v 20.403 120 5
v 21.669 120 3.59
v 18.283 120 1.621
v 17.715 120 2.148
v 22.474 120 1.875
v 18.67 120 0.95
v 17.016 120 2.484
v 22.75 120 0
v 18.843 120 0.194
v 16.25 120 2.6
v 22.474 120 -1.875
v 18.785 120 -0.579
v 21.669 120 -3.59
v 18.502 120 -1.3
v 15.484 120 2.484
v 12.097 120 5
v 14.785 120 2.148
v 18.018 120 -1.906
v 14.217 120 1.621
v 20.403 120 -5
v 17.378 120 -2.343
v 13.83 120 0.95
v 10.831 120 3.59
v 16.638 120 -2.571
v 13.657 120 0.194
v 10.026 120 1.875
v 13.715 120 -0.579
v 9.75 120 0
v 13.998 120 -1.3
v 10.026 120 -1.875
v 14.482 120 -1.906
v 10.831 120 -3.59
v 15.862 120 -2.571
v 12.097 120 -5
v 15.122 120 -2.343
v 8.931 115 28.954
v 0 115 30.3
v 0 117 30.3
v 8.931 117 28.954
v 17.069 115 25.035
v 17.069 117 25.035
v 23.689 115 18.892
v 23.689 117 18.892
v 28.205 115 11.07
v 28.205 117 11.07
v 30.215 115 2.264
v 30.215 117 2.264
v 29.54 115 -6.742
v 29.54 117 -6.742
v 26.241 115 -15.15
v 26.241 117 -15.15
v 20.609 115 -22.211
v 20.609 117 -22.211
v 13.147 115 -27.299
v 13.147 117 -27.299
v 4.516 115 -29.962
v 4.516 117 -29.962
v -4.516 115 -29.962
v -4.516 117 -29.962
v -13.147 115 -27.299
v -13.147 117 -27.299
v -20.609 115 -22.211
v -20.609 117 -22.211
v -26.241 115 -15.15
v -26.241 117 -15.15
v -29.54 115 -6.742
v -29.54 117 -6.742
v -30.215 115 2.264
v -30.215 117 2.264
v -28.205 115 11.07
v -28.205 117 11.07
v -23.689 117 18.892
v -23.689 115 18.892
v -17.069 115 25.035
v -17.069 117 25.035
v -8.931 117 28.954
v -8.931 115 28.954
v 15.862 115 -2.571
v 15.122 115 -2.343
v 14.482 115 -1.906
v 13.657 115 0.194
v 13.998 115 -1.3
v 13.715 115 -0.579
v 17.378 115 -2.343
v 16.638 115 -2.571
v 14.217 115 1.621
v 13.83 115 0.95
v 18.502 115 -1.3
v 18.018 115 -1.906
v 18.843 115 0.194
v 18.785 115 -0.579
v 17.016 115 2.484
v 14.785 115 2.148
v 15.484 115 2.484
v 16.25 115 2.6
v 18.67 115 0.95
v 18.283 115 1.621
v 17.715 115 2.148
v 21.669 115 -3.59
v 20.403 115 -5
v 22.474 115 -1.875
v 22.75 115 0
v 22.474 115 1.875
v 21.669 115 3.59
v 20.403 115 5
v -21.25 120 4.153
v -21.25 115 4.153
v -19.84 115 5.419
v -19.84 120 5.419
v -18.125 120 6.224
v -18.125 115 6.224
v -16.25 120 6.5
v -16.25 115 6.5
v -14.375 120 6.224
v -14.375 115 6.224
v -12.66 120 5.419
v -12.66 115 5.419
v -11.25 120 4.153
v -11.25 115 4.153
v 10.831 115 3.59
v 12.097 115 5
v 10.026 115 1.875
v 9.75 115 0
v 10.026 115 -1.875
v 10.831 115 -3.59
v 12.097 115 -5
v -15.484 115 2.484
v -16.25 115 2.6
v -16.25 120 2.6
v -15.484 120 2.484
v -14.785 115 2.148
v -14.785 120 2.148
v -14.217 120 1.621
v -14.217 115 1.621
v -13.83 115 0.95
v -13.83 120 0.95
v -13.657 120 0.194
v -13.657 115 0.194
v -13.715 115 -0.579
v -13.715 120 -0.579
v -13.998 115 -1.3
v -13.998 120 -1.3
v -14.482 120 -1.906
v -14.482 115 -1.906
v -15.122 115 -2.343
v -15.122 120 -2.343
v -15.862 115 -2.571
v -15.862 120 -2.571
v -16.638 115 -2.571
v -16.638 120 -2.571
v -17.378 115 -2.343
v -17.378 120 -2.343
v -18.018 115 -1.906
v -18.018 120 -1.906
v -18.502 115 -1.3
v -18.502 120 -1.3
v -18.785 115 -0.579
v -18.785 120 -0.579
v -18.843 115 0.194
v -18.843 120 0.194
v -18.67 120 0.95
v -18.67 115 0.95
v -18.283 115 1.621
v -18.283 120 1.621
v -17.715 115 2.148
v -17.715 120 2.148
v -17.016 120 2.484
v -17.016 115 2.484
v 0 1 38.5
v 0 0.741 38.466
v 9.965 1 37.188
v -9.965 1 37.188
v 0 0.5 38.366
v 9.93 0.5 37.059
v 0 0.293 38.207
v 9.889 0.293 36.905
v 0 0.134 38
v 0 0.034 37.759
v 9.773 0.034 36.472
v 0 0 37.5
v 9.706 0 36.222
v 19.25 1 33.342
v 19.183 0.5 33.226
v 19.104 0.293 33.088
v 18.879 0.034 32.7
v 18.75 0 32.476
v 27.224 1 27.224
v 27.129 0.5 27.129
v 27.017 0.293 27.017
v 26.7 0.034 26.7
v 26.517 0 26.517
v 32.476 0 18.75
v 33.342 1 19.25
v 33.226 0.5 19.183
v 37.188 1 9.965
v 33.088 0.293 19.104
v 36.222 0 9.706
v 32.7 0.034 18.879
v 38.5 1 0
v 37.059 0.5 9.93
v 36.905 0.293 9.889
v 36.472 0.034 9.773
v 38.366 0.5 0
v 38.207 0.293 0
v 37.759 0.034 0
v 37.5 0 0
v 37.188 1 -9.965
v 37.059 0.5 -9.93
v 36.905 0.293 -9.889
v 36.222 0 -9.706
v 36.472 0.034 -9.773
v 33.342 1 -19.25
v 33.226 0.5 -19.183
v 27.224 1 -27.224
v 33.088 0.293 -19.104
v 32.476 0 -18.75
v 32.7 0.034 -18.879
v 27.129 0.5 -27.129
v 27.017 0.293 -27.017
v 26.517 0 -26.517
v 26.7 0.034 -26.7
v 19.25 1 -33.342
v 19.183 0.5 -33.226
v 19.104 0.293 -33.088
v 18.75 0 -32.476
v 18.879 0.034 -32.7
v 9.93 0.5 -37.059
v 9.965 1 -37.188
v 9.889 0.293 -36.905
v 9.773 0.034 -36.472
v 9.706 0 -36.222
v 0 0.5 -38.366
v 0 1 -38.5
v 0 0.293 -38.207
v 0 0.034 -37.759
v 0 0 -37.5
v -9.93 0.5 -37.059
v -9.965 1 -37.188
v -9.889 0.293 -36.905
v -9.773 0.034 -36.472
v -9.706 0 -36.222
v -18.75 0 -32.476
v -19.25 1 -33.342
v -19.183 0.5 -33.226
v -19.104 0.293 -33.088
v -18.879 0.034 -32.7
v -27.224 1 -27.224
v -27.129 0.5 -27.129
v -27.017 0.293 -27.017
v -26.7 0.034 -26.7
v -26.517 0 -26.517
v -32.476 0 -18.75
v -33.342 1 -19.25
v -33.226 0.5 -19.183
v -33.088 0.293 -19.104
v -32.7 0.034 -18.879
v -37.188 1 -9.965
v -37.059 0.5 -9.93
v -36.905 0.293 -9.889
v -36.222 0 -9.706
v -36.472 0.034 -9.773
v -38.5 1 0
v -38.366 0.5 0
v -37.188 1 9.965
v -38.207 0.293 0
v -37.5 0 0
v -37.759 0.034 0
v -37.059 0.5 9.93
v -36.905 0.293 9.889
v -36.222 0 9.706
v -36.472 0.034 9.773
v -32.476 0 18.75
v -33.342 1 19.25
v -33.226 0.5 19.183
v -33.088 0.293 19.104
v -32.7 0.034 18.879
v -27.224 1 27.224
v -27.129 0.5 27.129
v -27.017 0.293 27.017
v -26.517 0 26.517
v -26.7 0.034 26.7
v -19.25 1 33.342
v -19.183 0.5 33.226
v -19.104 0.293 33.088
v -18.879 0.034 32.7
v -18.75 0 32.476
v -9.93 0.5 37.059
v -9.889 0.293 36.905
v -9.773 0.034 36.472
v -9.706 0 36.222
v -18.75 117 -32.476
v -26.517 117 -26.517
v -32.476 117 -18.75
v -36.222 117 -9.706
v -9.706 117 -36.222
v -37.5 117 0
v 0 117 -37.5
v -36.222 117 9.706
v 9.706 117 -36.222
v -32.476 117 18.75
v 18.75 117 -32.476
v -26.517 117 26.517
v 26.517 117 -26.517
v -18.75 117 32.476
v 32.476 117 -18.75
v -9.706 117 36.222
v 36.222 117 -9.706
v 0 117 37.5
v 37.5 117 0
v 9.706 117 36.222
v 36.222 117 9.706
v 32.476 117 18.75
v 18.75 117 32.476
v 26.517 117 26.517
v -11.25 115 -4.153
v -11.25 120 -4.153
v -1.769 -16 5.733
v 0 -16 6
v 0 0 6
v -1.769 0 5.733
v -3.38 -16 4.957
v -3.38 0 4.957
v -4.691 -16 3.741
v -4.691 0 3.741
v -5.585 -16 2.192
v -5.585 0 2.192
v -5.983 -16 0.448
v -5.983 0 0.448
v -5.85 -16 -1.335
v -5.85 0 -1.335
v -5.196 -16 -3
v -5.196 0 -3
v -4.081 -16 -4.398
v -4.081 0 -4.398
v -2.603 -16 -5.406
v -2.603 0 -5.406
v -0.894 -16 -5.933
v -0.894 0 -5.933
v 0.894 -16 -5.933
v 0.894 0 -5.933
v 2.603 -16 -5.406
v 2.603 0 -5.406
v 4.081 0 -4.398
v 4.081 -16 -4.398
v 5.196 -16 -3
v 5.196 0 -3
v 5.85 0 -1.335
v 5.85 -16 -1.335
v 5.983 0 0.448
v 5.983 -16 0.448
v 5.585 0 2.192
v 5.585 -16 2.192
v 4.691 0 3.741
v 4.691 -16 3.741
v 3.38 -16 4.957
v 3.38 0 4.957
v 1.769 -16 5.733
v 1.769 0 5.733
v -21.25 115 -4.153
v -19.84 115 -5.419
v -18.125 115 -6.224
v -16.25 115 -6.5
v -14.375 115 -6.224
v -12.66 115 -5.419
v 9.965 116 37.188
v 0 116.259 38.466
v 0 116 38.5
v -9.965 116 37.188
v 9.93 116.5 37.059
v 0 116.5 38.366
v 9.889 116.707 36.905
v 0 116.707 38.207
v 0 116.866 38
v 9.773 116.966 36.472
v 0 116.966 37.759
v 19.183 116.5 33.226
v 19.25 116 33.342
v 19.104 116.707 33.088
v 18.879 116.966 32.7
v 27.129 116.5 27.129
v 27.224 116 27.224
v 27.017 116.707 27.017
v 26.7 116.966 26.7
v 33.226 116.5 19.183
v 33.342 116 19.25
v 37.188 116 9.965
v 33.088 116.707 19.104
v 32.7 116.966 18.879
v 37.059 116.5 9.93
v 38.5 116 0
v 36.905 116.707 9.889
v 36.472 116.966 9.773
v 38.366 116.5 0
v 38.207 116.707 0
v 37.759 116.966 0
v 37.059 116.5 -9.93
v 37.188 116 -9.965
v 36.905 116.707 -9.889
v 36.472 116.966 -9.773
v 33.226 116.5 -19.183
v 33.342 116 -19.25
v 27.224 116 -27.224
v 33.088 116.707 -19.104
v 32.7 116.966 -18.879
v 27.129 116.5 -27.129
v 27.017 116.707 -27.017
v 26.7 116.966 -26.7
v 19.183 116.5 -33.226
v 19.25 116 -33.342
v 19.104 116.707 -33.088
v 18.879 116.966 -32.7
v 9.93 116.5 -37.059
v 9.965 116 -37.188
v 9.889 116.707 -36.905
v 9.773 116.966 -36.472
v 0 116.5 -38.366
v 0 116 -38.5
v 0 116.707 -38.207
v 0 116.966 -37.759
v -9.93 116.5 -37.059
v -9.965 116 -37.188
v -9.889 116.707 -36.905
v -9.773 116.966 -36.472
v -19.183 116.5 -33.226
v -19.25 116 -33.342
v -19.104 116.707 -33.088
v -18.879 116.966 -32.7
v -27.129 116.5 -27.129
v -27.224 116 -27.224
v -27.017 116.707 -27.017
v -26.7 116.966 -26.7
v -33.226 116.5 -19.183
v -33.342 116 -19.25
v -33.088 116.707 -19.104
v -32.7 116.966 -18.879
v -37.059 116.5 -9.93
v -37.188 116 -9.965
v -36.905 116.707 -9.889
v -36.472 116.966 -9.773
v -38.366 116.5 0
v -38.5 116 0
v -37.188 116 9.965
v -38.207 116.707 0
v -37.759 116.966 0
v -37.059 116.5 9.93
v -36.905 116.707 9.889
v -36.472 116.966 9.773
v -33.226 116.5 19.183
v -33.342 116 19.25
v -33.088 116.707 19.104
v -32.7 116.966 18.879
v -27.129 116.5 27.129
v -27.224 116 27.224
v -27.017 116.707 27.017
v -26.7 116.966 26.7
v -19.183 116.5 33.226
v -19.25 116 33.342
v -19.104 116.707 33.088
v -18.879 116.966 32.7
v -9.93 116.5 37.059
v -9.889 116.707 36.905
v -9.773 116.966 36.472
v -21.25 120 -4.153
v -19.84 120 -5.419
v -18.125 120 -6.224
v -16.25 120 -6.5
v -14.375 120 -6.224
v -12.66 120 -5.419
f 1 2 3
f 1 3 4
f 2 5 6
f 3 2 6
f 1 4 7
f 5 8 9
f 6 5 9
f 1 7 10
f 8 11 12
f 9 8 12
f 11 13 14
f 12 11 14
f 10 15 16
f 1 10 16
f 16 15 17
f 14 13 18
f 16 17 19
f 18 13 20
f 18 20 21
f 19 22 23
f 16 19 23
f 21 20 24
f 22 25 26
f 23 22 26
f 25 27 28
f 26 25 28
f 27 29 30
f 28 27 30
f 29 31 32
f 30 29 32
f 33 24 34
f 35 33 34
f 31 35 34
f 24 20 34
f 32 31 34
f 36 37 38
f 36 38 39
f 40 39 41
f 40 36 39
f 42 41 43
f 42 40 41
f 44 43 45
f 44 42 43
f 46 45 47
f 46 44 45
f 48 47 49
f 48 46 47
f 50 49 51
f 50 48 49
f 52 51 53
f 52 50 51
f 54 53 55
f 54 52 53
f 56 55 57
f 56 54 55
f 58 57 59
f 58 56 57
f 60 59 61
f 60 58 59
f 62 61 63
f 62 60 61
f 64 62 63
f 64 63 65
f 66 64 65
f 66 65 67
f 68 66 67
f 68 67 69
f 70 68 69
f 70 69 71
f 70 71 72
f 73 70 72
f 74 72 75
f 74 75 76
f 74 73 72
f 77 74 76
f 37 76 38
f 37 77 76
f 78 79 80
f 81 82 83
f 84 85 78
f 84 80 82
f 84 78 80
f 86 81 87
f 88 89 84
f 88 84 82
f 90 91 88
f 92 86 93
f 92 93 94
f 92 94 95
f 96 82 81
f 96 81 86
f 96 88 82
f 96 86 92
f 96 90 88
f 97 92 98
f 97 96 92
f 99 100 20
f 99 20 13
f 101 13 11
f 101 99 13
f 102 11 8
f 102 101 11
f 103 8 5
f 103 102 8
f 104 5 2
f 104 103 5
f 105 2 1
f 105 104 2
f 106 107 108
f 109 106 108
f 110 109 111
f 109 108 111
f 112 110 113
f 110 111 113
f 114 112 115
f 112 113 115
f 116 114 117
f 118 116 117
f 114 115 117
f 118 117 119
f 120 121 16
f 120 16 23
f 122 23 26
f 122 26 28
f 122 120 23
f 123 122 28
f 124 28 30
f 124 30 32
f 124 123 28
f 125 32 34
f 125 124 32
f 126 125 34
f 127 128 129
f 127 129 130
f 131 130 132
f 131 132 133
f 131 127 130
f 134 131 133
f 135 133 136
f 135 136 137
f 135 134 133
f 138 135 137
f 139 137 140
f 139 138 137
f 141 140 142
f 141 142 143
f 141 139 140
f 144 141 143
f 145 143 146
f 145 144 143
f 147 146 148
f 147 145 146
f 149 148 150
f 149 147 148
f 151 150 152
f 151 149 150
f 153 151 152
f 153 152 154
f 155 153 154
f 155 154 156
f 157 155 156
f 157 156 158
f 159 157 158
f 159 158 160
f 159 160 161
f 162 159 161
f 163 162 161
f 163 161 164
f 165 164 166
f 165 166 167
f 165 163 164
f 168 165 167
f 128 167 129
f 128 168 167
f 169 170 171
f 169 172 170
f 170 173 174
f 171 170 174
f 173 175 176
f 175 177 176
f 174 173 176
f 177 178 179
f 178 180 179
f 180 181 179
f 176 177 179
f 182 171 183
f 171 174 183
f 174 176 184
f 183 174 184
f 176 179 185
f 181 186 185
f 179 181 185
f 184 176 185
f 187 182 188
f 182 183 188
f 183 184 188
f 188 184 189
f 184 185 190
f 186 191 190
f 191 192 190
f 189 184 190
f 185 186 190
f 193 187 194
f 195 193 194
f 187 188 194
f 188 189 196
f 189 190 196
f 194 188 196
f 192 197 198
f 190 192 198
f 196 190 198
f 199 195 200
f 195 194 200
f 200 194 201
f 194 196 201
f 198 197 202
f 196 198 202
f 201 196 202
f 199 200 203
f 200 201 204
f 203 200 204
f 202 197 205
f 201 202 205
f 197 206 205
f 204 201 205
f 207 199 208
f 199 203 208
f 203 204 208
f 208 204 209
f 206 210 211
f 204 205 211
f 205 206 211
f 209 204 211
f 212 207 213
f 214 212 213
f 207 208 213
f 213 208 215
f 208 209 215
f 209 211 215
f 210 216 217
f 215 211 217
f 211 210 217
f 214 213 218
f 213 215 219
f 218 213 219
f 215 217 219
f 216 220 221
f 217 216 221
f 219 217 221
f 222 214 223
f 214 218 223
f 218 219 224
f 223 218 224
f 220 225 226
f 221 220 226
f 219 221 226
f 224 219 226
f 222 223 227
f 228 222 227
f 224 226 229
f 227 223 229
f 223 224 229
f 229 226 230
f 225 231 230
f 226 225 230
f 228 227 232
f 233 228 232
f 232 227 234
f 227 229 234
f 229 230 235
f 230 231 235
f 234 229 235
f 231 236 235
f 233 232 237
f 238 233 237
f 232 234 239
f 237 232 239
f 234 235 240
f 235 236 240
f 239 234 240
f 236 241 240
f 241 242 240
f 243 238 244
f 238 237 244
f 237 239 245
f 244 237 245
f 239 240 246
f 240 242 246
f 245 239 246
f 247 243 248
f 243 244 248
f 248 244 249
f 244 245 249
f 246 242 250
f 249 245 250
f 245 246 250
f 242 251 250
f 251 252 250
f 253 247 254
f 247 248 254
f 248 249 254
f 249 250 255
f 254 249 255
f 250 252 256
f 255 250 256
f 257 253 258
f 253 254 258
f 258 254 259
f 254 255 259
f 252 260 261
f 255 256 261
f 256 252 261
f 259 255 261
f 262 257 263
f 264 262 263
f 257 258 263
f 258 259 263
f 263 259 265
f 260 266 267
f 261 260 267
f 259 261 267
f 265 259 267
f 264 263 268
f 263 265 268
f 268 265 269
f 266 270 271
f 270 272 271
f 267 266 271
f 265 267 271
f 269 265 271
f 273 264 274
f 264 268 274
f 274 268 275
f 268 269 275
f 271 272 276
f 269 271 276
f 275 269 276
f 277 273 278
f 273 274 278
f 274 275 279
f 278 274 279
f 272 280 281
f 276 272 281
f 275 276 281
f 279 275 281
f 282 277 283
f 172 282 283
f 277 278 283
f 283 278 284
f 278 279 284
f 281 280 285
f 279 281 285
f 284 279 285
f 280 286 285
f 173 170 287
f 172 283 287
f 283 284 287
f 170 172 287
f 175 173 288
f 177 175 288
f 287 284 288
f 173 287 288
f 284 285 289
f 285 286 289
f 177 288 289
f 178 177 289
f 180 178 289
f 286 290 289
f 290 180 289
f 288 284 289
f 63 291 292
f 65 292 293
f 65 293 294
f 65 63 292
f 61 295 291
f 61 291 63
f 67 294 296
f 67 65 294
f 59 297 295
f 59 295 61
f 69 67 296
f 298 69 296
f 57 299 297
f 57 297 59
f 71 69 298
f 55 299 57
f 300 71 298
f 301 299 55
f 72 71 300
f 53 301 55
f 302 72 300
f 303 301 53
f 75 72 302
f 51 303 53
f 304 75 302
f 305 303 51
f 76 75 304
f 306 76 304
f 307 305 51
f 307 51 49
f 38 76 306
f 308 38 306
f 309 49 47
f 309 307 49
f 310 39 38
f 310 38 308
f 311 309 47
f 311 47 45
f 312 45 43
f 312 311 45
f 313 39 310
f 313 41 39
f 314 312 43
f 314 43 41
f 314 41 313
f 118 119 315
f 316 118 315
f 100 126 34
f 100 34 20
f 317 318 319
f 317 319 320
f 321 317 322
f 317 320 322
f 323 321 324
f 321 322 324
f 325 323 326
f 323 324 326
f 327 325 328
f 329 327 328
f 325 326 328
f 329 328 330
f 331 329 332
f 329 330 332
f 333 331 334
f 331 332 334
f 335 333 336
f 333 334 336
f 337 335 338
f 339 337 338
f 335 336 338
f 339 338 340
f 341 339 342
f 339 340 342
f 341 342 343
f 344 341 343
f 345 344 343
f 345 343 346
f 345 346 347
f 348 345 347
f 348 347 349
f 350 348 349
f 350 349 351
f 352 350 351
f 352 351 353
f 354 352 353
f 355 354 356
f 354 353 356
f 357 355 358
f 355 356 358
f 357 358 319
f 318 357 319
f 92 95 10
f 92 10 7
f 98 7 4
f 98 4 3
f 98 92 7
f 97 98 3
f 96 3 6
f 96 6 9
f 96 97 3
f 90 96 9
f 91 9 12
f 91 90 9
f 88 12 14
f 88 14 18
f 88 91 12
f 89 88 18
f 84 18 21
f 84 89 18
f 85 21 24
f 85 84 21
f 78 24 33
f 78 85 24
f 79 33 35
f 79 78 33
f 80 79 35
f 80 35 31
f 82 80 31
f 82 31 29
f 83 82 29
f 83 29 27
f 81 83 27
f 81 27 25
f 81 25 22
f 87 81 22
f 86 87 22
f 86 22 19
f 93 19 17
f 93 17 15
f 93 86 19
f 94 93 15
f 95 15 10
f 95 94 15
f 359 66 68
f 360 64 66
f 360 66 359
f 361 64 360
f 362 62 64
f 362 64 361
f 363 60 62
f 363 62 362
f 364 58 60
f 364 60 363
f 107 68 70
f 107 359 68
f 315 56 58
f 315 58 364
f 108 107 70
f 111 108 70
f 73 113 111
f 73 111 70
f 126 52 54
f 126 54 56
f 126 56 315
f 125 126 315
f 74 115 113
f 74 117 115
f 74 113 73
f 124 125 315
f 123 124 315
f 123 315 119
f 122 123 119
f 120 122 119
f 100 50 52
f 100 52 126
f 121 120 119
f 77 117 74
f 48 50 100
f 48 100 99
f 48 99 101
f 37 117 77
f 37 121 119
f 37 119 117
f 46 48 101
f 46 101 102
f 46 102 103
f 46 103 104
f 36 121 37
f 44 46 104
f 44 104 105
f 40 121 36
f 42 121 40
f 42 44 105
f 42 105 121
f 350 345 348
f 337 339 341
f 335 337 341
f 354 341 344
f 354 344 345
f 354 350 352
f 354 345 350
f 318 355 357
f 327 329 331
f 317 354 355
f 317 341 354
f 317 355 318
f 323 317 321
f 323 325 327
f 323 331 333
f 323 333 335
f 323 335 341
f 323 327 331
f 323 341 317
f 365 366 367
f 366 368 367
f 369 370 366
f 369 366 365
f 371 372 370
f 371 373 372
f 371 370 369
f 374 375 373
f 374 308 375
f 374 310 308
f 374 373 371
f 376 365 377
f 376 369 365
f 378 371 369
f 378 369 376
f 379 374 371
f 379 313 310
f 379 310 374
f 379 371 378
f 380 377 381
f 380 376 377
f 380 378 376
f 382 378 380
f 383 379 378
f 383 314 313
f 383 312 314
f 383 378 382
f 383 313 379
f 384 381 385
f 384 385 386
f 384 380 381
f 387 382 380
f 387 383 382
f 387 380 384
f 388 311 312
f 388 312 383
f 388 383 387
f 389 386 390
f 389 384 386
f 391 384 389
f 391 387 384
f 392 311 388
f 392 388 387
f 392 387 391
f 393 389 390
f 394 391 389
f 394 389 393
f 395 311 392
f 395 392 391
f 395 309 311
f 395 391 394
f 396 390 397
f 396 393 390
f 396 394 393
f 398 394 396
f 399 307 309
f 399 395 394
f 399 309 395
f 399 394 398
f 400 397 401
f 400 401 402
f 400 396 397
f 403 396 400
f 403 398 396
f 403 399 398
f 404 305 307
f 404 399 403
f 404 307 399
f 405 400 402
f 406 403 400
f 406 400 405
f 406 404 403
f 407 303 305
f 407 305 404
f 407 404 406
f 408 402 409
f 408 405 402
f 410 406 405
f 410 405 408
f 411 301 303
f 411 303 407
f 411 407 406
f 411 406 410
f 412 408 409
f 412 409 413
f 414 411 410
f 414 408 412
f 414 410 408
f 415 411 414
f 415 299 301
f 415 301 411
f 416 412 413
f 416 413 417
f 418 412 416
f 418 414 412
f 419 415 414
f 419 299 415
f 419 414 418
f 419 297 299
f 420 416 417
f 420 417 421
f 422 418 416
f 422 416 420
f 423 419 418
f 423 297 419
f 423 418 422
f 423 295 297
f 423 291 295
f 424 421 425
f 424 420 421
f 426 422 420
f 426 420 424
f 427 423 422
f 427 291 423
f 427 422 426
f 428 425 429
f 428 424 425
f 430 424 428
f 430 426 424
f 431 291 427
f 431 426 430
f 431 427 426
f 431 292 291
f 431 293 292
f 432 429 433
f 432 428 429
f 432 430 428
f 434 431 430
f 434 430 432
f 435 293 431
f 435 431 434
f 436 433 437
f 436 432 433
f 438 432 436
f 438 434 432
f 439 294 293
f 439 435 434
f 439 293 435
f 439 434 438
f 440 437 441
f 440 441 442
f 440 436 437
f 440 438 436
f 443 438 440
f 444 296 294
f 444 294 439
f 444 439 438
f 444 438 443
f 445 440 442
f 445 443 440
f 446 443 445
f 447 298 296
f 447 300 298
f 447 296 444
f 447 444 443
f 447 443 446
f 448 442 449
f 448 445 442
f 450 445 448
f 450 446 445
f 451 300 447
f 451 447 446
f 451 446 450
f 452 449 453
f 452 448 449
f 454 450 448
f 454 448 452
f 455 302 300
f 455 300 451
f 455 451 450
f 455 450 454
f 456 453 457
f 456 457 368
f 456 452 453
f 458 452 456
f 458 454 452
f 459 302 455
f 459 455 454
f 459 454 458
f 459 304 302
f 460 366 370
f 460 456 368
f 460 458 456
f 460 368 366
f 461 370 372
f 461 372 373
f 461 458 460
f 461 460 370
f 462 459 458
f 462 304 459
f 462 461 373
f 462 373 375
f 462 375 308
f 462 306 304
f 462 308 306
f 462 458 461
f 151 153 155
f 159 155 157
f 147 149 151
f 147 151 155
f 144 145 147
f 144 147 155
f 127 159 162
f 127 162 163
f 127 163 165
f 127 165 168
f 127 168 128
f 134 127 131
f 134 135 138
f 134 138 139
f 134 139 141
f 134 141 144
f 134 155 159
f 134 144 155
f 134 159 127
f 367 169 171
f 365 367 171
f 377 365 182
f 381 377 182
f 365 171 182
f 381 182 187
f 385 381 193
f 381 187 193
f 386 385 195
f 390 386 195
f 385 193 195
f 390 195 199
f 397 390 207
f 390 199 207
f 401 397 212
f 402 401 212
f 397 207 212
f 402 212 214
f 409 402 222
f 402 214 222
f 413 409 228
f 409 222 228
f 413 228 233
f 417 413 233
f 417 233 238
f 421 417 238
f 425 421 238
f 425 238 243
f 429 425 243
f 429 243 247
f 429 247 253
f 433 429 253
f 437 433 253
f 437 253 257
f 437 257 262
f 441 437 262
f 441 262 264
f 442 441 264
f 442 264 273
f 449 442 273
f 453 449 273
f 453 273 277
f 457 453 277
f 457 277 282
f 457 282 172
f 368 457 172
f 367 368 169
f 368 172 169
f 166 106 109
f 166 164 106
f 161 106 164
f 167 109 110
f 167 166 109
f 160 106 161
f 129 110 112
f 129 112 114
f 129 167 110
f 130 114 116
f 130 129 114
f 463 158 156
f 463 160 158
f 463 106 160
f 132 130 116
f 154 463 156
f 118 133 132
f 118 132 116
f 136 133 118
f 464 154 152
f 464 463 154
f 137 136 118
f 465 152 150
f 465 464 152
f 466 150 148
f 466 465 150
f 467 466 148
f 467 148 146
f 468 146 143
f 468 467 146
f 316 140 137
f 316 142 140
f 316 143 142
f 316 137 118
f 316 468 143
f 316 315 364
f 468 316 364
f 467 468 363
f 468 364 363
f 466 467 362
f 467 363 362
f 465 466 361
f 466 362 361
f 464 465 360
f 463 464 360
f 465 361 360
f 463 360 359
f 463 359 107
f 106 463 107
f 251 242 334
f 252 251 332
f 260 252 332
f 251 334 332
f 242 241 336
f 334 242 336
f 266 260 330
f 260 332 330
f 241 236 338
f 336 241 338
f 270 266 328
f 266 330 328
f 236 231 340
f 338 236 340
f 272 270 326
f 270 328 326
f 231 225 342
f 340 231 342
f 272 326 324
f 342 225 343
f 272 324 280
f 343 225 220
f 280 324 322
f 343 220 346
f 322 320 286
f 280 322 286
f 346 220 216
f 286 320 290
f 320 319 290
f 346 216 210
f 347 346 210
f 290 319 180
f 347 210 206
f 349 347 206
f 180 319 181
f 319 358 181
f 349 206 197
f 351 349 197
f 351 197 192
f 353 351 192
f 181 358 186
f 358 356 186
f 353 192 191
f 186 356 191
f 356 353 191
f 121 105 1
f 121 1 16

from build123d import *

# Parameters (mm, degrees)
SKETCH1_R           = 38.5
BOSS_EXTRUDE1_DEPTH = 115
SKETCH2_R           = 2.6
BOSS_EXTRUDE2_DEPTH = 5
SKETCH3_R           = 38.5
SKETCH3_R_2         = 30.3
BOSS_EXTRUDE3_DEPTH = 2
FILLET1_R           = 1
ESQUISSE1_R         = 6
BOSS_EXTRU_1_DEPTH  = 16


with BuildPart() as part:
    # Sketch1 → Boss-Extrude1 (new body)
    with BuildSketch(Plane(origin=(0, 0, 0), x_dir=(1, 0, 0), z_dir=(0, 1, 0))):
        with Locations(Location((0, 0, 0), (0, 0, 270))):
            Circle(SKETCH1_R)
    extrude(amount=BOSS_EXTRUDE1_DEPTH)

    # Sketch2 → Boss-Extrude2 (add)
    # profile 1 of 2: a face of its own
    with BuildSketch(Plane(origin=(0, 115, 0), x_dir=(1, 0, 0), z_dir=(0, 1, 0))):
        with BuildLine():
            Line((-21.25, 4.153311931), (-21.25, -4.153311931))
            ThreePointArc((-21.25, -4.153311931), (-16.25, -6.5), (-11.25, -4.153311931))
            Line((-11.25, -4.153311931), (-11.25, 4.153311931))
            ThreePointArc((-11.25, 4.153311931), (-16.25, 6.5), (-21.25, 4.153311931))
        make_face()
        with Locations(Location((-16.25, 0, 0), (0, 0, 270))):
            Circle(SKETCH2_R, mode=Mode.SUBTRACT)
    # profile 2 of 2: a face of its own
    with BuildSketch(Plane(origin=(0, 115, 0), x_dir=(1, 0, 0), z_dir=(0, 1, 0))):
        with BuildLine():
            Line((12.096688069, 5), (20.403311931, 5))
            ThreePointArc((20.403311931, 5), (22.75, 0), (20.403311931, -5))
            Line((20.403311931, -5), (12.096688069, -5))
            ThreePointArc((12.096688069, -5), (9.75, 0), (12.096688069, 5))
        make_face()
        with Locations(Location((16.25, 0, 0), (0, 0, 270))):
            Circle(SKETCH2_R, mode=Mode.SUBTRACT)
    extrude(amount=BOSS_EXTRUDE2_DEPTH)

    # Sketch3 → Boss-Extrude3 (add)
    with BuildSketch(Plane(origin=(0, 115, 0), x_dir=(1, 0, 0), z_dir=(0, 1, 0))):
        with Locations(Location((0, 0, 0), (0, 0, 270))):
            Circle(SKETCH3_R)
        with Locations(Location((0, 0, 0), (0, 0, 270))):
            Circle(SKETCH3_R_2, mode=Mode.SUBTRACT)
    extrude(amount=BOSS_EXTRUDE3_DEPTH)

    # Fillet1
    fillet1_edges = [part.edges().sort_by_distance(p)[0] for p in [
        (0, 0, -38.5),
        (0, 117, -38.5),
    ]]
    fillet(fillet1_edges, radius=FILLET1_R)

    # Esquisse1 → Boss.-Extru.1 (add)
    with BuildSketch(Plane.XZ):
        with Locations(Location((0, 0, 0), (0, 0, 90))):
            Circle(ESQUISSE1_R)
    extrude(amount=BOSS_EXTRU_1_DEPTH)


solid = part.part
